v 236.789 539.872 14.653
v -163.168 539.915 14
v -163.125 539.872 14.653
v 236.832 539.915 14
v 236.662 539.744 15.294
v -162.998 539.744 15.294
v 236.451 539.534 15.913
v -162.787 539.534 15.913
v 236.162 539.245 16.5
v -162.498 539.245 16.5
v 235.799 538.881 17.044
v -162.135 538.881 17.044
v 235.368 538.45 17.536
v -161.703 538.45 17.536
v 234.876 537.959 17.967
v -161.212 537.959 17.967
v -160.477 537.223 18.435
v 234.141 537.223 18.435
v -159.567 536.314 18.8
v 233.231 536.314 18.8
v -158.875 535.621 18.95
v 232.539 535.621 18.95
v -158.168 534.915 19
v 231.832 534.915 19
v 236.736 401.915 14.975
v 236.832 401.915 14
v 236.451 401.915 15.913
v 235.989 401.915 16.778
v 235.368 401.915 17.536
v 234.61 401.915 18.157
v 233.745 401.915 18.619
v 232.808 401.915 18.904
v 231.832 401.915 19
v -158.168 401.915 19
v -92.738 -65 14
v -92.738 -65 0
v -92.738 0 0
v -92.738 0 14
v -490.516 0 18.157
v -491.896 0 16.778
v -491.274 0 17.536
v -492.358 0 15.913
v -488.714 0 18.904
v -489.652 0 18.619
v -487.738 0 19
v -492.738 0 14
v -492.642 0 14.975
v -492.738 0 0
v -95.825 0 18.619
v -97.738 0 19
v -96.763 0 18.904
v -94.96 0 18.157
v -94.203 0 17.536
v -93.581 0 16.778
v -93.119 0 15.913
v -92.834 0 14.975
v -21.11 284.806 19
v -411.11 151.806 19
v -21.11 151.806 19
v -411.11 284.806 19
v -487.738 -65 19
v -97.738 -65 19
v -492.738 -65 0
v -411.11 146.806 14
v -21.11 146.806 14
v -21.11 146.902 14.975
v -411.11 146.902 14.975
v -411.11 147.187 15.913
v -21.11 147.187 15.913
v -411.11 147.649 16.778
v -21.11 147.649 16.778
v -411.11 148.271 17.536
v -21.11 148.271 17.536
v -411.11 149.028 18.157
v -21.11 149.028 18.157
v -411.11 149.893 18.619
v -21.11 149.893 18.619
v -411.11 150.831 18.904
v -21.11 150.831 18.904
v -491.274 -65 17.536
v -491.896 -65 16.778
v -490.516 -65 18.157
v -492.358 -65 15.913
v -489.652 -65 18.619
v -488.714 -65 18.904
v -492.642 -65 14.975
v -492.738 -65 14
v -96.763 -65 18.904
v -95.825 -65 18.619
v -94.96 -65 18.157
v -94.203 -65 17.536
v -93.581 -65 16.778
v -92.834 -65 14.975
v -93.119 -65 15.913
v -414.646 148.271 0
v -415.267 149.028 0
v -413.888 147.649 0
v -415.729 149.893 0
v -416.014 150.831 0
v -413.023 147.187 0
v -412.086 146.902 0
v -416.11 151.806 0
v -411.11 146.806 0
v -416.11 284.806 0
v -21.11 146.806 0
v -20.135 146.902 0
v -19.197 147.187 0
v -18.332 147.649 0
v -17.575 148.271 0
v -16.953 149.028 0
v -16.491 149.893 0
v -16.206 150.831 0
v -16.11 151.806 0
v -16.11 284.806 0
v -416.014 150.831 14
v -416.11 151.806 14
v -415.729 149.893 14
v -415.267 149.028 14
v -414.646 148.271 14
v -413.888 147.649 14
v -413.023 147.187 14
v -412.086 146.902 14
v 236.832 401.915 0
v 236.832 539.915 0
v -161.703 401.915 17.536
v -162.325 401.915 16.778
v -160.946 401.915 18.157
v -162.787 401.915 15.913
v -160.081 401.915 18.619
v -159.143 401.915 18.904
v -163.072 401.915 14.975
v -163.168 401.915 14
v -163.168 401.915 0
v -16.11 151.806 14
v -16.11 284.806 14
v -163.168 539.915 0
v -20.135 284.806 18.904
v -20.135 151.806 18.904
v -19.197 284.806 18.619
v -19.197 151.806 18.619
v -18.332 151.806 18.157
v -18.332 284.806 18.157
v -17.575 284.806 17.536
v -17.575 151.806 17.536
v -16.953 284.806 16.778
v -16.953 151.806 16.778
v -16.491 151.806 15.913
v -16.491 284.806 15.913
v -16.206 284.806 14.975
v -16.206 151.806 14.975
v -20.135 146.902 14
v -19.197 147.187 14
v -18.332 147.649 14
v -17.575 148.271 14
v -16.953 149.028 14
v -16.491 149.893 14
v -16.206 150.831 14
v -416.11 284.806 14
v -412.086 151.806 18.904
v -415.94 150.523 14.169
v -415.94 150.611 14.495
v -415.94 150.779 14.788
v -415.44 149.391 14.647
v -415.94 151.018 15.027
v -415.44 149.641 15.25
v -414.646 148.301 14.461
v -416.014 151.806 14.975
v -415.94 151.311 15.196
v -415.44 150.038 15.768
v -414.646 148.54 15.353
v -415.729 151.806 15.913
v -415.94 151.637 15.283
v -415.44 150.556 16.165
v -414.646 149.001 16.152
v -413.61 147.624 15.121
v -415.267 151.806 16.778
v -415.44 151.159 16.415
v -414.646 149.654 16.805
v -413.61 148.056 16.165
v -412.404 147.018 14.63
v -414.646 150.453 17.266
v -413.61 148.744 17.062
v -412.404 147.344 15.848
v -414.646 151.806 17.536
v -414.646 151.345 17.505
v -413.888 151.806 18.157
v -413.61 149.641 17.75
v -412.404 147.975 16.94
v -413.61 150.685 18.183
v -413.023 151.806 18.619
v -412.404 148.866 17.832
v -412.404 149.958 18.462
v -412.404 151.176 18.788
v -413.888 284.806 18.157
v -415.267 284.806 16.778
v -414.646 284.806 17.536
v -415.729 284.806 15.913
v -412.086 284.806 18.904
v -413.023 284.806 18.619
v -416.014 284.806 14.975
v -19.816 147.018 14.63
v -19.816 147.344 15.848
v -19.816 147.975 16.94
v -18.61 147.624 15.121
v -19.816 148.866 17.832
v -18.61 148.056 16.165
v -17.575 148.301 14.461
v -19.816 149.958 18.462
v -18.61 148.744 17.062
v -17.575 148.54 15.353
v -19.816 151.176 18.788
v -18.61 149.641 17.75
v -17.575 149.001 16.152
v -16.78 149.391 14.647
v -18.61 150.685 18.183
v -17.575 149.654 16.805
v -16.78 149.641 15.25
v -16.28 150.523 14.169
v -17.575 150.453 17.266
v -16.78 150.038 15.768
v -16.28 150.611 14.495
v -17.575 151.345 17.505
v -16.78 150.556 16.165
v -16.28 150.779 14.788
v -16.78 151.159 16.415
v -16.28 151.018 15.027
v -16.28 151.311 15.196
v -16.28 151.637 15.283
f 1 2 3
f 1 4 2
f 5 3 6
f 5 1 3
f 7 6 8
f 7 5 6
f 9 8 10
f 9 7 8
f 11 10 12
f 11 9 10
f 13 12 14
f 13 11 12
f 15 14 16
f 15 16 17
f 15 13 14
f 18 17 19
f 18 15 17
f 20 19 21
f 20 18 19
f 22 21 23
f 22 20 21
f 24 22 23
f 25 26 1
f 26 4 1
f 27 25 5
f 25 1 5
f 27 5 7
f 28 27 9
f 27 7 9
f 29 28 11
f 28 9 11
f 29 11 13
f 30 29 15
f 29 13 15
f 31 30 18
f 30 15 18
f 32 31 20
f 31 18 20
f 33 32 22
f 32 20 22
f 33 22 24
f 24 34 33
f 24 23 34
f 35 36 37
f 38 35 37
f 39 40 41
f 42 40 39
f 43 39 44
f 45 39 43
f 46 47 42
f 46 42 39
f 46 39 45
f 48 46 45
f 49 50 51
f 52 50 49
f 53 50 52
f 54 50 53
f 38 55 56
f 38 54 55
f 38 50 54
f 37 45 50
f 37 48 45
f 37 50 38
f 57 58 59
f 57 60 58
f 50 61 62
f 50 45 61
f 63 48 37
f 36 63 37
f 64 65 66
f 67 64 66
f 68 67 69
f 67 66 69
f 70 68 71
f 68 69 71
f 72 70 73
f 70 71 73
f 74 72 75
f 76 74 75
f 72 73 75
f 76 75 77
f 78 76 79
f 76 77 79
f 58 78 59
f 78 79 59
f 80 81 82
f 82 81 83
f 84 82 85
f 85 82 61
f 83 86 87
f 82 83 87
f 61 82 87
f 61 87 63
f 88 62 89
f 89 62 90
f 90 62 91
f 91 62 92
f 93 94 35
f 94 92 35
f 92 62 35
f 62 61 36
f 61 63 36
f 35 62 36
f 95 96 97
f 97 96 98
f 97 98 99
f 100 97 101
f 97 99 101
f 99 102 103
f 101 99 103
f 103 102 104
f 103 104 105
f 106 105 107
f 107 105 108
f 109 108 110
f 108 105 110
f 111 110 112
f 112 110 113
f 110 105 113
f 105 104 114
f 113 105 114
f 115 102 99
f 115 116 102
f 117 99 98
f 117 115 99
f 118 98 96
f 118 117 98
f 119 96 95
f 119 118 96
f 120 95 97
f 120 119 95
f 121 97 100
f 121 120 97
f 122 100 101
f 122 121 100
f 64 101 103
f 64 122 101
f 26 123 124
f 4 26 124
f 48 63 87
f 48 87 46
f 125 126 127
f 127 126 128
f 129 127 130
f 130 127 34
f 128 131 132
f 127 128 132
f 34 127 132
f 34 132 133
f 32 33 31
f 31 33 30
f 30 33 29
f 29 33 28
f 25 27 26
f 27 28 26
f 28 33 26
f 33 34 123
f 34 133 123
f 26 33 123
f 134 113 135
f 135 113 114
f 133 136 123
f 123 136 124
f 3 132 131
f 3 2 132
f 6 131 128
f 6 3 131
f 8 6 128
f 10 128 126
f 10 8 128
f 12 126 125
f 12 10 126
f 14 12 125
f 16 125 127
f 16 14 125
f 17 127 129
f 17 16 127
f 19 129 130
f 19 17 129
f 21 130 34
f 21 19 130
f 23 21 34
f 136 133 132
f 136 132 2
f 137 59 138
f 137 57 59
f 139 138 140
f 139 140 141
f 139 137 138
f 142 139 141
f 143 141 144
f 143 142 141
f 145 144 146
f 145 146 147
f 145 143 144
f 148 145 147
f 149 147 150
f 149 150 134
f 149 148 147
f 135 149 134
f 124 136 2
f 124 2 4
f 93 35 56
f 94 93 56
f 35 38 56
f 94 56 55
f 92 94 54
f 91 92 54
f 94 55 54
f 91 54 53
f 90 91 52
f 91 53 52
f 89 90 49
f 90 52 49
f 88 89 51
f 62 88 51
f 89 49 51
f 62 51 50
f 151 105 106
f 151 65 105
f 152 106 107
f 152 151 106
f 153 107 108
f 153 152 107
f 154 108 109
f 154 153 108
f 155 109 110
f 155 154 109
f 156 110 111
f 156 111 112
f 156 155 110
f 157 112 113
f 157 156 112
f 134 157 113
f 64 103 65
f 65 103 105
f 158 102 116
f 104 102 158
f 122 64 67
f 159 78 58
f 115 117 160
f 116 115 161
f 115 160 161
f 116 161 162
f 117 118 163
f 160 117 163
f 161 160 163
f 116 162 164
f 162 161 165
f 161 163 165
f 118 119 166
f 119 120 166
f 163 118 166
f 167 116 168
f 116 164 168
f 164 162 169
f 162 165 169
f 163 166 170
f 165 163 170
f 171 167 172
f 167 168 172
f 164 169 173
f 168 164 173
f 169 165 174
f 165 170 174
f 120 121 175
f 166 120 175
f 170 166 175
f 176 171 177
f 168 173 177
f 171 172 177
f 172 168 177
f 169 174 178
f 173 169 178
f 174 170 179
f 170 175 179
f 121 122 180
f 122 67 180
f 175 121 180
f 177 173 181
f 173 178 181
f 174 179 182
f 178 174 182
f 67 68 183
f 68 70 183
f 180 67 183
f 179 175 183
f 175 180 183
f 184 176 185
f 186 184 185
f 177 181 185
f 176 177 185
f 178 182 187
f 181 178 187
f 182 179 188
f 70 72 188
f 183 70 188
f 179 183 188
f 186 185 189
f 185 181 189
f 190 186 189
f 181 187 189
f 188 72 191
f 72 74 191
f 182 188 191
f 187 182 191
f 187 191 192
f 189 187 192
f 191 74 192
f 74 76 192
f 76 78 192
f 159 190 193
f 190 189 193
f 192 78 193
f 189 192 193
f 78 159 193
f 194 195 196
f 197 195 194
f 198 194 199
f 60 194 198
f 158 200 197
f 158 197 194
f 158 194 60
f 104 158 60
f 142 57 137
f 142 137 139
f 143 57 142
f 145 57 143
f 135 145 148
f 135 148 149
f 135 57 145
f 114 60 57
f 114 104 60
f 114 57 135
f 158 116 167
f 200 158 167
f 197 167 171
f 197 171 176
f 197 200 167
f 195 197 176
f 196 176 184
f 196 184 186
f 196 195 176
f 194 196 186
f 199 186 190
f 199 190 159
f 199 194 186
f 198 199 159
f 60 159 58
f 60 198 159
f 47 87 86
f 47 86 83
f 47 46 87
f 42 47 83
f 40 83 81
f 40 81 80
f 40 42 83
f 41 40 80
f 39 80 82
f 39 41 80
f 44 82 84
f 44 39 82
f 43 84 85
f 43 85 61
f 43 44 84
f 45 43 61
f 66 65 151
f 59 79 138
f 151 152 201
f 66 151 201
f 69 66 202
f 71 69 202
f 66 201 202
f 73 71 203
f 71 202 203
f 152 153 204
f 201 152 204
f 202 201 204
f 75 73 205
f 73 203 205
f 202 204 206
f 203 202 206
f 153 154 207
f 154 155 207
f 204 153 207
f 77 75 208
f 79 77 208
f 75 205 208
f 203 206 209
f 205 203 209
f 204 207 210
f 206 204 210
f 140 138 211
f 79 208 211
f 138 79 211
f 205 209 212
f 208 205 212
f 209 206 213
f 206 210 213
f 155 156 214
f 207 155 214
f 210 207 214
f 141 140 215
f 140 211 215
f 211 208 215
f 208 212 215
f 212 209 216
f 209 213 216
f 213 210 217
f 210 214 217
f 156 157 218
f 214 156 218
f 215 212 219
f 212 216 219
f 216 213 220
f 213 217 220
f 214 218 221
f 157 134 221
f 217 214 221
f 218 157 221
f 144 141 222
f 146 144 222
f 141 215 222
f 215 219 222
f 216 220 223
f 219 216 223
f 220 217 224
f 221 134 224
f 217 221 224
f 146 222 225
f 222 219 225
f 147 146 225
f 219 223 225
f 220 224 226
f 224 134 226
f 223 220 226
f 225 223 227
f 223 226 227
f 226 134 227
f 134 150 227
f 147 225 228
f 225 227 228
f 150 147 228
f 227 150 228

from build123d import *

# Parameters (mm, degrees)
F0_W     = 400
F0_H     = 65
F0_H_2   = 138
F1_DEPTH = 19
F2_R     = 5
F3_R     = 5
F4_R     = 5
F5_R     = 5
F6_R     = 5


with BuildPart() as f1:
    # F0 (on Top) → F1 (new body)
    with BuildSketch(Plane.XY):
        with Locations((-292.738175, -32.5)):
            Rectangle(F0_W, F0_H)
        with Locations((-216.110053, 215.806119)):
            Rectangle(F0_W, F0_H_2)
        with Locations((36.832077, 470.914705)):
            Rectangle(F0_W, F0_H_2)
    extrude(amount=F1_DEPTH)

    # F2
    f2_edges = [f1.edges().sort_by_distance(p)[0] for p in [
        (-216.110053, 146.806119, 19),
    ]]
    fillet(f2_edges, radius=F2_R)

    # F3
    f3_edges = [f1.edges().sort_by_distance(p)[0] for p in [
        (-16.110053, 218.306119, 19),
    ]]
    fillet(f3_edges, radius=F3_R)

    # F4
    f4_edges = [f1.edges().sort_by_distance(p)[0] for p in [
        (-416.110053, 218.306119, 19),
    ]]
    fillet(f4_edges, radius=F4_R)

    # F5
    f5_edges = [f1.edges().sort_by_distance(p)[0] for p in [
        (-492.738175, -32.5, 19),
        (-92.738175, -32.5, 19),
    ]]
    fillet(f5_edges, radius=F5_R)

    # F6
    f6_edges = [f1.edges().sort_by_distance(p)[0] for p in [
        (-163.167923, 470.914705, 19),
        (36.832077, 539.914705, 19),
        (236.832077, 470.914705, 19),
    ]]
    fillet(f6_edges, radius=F6_R)


solid = f1.part
